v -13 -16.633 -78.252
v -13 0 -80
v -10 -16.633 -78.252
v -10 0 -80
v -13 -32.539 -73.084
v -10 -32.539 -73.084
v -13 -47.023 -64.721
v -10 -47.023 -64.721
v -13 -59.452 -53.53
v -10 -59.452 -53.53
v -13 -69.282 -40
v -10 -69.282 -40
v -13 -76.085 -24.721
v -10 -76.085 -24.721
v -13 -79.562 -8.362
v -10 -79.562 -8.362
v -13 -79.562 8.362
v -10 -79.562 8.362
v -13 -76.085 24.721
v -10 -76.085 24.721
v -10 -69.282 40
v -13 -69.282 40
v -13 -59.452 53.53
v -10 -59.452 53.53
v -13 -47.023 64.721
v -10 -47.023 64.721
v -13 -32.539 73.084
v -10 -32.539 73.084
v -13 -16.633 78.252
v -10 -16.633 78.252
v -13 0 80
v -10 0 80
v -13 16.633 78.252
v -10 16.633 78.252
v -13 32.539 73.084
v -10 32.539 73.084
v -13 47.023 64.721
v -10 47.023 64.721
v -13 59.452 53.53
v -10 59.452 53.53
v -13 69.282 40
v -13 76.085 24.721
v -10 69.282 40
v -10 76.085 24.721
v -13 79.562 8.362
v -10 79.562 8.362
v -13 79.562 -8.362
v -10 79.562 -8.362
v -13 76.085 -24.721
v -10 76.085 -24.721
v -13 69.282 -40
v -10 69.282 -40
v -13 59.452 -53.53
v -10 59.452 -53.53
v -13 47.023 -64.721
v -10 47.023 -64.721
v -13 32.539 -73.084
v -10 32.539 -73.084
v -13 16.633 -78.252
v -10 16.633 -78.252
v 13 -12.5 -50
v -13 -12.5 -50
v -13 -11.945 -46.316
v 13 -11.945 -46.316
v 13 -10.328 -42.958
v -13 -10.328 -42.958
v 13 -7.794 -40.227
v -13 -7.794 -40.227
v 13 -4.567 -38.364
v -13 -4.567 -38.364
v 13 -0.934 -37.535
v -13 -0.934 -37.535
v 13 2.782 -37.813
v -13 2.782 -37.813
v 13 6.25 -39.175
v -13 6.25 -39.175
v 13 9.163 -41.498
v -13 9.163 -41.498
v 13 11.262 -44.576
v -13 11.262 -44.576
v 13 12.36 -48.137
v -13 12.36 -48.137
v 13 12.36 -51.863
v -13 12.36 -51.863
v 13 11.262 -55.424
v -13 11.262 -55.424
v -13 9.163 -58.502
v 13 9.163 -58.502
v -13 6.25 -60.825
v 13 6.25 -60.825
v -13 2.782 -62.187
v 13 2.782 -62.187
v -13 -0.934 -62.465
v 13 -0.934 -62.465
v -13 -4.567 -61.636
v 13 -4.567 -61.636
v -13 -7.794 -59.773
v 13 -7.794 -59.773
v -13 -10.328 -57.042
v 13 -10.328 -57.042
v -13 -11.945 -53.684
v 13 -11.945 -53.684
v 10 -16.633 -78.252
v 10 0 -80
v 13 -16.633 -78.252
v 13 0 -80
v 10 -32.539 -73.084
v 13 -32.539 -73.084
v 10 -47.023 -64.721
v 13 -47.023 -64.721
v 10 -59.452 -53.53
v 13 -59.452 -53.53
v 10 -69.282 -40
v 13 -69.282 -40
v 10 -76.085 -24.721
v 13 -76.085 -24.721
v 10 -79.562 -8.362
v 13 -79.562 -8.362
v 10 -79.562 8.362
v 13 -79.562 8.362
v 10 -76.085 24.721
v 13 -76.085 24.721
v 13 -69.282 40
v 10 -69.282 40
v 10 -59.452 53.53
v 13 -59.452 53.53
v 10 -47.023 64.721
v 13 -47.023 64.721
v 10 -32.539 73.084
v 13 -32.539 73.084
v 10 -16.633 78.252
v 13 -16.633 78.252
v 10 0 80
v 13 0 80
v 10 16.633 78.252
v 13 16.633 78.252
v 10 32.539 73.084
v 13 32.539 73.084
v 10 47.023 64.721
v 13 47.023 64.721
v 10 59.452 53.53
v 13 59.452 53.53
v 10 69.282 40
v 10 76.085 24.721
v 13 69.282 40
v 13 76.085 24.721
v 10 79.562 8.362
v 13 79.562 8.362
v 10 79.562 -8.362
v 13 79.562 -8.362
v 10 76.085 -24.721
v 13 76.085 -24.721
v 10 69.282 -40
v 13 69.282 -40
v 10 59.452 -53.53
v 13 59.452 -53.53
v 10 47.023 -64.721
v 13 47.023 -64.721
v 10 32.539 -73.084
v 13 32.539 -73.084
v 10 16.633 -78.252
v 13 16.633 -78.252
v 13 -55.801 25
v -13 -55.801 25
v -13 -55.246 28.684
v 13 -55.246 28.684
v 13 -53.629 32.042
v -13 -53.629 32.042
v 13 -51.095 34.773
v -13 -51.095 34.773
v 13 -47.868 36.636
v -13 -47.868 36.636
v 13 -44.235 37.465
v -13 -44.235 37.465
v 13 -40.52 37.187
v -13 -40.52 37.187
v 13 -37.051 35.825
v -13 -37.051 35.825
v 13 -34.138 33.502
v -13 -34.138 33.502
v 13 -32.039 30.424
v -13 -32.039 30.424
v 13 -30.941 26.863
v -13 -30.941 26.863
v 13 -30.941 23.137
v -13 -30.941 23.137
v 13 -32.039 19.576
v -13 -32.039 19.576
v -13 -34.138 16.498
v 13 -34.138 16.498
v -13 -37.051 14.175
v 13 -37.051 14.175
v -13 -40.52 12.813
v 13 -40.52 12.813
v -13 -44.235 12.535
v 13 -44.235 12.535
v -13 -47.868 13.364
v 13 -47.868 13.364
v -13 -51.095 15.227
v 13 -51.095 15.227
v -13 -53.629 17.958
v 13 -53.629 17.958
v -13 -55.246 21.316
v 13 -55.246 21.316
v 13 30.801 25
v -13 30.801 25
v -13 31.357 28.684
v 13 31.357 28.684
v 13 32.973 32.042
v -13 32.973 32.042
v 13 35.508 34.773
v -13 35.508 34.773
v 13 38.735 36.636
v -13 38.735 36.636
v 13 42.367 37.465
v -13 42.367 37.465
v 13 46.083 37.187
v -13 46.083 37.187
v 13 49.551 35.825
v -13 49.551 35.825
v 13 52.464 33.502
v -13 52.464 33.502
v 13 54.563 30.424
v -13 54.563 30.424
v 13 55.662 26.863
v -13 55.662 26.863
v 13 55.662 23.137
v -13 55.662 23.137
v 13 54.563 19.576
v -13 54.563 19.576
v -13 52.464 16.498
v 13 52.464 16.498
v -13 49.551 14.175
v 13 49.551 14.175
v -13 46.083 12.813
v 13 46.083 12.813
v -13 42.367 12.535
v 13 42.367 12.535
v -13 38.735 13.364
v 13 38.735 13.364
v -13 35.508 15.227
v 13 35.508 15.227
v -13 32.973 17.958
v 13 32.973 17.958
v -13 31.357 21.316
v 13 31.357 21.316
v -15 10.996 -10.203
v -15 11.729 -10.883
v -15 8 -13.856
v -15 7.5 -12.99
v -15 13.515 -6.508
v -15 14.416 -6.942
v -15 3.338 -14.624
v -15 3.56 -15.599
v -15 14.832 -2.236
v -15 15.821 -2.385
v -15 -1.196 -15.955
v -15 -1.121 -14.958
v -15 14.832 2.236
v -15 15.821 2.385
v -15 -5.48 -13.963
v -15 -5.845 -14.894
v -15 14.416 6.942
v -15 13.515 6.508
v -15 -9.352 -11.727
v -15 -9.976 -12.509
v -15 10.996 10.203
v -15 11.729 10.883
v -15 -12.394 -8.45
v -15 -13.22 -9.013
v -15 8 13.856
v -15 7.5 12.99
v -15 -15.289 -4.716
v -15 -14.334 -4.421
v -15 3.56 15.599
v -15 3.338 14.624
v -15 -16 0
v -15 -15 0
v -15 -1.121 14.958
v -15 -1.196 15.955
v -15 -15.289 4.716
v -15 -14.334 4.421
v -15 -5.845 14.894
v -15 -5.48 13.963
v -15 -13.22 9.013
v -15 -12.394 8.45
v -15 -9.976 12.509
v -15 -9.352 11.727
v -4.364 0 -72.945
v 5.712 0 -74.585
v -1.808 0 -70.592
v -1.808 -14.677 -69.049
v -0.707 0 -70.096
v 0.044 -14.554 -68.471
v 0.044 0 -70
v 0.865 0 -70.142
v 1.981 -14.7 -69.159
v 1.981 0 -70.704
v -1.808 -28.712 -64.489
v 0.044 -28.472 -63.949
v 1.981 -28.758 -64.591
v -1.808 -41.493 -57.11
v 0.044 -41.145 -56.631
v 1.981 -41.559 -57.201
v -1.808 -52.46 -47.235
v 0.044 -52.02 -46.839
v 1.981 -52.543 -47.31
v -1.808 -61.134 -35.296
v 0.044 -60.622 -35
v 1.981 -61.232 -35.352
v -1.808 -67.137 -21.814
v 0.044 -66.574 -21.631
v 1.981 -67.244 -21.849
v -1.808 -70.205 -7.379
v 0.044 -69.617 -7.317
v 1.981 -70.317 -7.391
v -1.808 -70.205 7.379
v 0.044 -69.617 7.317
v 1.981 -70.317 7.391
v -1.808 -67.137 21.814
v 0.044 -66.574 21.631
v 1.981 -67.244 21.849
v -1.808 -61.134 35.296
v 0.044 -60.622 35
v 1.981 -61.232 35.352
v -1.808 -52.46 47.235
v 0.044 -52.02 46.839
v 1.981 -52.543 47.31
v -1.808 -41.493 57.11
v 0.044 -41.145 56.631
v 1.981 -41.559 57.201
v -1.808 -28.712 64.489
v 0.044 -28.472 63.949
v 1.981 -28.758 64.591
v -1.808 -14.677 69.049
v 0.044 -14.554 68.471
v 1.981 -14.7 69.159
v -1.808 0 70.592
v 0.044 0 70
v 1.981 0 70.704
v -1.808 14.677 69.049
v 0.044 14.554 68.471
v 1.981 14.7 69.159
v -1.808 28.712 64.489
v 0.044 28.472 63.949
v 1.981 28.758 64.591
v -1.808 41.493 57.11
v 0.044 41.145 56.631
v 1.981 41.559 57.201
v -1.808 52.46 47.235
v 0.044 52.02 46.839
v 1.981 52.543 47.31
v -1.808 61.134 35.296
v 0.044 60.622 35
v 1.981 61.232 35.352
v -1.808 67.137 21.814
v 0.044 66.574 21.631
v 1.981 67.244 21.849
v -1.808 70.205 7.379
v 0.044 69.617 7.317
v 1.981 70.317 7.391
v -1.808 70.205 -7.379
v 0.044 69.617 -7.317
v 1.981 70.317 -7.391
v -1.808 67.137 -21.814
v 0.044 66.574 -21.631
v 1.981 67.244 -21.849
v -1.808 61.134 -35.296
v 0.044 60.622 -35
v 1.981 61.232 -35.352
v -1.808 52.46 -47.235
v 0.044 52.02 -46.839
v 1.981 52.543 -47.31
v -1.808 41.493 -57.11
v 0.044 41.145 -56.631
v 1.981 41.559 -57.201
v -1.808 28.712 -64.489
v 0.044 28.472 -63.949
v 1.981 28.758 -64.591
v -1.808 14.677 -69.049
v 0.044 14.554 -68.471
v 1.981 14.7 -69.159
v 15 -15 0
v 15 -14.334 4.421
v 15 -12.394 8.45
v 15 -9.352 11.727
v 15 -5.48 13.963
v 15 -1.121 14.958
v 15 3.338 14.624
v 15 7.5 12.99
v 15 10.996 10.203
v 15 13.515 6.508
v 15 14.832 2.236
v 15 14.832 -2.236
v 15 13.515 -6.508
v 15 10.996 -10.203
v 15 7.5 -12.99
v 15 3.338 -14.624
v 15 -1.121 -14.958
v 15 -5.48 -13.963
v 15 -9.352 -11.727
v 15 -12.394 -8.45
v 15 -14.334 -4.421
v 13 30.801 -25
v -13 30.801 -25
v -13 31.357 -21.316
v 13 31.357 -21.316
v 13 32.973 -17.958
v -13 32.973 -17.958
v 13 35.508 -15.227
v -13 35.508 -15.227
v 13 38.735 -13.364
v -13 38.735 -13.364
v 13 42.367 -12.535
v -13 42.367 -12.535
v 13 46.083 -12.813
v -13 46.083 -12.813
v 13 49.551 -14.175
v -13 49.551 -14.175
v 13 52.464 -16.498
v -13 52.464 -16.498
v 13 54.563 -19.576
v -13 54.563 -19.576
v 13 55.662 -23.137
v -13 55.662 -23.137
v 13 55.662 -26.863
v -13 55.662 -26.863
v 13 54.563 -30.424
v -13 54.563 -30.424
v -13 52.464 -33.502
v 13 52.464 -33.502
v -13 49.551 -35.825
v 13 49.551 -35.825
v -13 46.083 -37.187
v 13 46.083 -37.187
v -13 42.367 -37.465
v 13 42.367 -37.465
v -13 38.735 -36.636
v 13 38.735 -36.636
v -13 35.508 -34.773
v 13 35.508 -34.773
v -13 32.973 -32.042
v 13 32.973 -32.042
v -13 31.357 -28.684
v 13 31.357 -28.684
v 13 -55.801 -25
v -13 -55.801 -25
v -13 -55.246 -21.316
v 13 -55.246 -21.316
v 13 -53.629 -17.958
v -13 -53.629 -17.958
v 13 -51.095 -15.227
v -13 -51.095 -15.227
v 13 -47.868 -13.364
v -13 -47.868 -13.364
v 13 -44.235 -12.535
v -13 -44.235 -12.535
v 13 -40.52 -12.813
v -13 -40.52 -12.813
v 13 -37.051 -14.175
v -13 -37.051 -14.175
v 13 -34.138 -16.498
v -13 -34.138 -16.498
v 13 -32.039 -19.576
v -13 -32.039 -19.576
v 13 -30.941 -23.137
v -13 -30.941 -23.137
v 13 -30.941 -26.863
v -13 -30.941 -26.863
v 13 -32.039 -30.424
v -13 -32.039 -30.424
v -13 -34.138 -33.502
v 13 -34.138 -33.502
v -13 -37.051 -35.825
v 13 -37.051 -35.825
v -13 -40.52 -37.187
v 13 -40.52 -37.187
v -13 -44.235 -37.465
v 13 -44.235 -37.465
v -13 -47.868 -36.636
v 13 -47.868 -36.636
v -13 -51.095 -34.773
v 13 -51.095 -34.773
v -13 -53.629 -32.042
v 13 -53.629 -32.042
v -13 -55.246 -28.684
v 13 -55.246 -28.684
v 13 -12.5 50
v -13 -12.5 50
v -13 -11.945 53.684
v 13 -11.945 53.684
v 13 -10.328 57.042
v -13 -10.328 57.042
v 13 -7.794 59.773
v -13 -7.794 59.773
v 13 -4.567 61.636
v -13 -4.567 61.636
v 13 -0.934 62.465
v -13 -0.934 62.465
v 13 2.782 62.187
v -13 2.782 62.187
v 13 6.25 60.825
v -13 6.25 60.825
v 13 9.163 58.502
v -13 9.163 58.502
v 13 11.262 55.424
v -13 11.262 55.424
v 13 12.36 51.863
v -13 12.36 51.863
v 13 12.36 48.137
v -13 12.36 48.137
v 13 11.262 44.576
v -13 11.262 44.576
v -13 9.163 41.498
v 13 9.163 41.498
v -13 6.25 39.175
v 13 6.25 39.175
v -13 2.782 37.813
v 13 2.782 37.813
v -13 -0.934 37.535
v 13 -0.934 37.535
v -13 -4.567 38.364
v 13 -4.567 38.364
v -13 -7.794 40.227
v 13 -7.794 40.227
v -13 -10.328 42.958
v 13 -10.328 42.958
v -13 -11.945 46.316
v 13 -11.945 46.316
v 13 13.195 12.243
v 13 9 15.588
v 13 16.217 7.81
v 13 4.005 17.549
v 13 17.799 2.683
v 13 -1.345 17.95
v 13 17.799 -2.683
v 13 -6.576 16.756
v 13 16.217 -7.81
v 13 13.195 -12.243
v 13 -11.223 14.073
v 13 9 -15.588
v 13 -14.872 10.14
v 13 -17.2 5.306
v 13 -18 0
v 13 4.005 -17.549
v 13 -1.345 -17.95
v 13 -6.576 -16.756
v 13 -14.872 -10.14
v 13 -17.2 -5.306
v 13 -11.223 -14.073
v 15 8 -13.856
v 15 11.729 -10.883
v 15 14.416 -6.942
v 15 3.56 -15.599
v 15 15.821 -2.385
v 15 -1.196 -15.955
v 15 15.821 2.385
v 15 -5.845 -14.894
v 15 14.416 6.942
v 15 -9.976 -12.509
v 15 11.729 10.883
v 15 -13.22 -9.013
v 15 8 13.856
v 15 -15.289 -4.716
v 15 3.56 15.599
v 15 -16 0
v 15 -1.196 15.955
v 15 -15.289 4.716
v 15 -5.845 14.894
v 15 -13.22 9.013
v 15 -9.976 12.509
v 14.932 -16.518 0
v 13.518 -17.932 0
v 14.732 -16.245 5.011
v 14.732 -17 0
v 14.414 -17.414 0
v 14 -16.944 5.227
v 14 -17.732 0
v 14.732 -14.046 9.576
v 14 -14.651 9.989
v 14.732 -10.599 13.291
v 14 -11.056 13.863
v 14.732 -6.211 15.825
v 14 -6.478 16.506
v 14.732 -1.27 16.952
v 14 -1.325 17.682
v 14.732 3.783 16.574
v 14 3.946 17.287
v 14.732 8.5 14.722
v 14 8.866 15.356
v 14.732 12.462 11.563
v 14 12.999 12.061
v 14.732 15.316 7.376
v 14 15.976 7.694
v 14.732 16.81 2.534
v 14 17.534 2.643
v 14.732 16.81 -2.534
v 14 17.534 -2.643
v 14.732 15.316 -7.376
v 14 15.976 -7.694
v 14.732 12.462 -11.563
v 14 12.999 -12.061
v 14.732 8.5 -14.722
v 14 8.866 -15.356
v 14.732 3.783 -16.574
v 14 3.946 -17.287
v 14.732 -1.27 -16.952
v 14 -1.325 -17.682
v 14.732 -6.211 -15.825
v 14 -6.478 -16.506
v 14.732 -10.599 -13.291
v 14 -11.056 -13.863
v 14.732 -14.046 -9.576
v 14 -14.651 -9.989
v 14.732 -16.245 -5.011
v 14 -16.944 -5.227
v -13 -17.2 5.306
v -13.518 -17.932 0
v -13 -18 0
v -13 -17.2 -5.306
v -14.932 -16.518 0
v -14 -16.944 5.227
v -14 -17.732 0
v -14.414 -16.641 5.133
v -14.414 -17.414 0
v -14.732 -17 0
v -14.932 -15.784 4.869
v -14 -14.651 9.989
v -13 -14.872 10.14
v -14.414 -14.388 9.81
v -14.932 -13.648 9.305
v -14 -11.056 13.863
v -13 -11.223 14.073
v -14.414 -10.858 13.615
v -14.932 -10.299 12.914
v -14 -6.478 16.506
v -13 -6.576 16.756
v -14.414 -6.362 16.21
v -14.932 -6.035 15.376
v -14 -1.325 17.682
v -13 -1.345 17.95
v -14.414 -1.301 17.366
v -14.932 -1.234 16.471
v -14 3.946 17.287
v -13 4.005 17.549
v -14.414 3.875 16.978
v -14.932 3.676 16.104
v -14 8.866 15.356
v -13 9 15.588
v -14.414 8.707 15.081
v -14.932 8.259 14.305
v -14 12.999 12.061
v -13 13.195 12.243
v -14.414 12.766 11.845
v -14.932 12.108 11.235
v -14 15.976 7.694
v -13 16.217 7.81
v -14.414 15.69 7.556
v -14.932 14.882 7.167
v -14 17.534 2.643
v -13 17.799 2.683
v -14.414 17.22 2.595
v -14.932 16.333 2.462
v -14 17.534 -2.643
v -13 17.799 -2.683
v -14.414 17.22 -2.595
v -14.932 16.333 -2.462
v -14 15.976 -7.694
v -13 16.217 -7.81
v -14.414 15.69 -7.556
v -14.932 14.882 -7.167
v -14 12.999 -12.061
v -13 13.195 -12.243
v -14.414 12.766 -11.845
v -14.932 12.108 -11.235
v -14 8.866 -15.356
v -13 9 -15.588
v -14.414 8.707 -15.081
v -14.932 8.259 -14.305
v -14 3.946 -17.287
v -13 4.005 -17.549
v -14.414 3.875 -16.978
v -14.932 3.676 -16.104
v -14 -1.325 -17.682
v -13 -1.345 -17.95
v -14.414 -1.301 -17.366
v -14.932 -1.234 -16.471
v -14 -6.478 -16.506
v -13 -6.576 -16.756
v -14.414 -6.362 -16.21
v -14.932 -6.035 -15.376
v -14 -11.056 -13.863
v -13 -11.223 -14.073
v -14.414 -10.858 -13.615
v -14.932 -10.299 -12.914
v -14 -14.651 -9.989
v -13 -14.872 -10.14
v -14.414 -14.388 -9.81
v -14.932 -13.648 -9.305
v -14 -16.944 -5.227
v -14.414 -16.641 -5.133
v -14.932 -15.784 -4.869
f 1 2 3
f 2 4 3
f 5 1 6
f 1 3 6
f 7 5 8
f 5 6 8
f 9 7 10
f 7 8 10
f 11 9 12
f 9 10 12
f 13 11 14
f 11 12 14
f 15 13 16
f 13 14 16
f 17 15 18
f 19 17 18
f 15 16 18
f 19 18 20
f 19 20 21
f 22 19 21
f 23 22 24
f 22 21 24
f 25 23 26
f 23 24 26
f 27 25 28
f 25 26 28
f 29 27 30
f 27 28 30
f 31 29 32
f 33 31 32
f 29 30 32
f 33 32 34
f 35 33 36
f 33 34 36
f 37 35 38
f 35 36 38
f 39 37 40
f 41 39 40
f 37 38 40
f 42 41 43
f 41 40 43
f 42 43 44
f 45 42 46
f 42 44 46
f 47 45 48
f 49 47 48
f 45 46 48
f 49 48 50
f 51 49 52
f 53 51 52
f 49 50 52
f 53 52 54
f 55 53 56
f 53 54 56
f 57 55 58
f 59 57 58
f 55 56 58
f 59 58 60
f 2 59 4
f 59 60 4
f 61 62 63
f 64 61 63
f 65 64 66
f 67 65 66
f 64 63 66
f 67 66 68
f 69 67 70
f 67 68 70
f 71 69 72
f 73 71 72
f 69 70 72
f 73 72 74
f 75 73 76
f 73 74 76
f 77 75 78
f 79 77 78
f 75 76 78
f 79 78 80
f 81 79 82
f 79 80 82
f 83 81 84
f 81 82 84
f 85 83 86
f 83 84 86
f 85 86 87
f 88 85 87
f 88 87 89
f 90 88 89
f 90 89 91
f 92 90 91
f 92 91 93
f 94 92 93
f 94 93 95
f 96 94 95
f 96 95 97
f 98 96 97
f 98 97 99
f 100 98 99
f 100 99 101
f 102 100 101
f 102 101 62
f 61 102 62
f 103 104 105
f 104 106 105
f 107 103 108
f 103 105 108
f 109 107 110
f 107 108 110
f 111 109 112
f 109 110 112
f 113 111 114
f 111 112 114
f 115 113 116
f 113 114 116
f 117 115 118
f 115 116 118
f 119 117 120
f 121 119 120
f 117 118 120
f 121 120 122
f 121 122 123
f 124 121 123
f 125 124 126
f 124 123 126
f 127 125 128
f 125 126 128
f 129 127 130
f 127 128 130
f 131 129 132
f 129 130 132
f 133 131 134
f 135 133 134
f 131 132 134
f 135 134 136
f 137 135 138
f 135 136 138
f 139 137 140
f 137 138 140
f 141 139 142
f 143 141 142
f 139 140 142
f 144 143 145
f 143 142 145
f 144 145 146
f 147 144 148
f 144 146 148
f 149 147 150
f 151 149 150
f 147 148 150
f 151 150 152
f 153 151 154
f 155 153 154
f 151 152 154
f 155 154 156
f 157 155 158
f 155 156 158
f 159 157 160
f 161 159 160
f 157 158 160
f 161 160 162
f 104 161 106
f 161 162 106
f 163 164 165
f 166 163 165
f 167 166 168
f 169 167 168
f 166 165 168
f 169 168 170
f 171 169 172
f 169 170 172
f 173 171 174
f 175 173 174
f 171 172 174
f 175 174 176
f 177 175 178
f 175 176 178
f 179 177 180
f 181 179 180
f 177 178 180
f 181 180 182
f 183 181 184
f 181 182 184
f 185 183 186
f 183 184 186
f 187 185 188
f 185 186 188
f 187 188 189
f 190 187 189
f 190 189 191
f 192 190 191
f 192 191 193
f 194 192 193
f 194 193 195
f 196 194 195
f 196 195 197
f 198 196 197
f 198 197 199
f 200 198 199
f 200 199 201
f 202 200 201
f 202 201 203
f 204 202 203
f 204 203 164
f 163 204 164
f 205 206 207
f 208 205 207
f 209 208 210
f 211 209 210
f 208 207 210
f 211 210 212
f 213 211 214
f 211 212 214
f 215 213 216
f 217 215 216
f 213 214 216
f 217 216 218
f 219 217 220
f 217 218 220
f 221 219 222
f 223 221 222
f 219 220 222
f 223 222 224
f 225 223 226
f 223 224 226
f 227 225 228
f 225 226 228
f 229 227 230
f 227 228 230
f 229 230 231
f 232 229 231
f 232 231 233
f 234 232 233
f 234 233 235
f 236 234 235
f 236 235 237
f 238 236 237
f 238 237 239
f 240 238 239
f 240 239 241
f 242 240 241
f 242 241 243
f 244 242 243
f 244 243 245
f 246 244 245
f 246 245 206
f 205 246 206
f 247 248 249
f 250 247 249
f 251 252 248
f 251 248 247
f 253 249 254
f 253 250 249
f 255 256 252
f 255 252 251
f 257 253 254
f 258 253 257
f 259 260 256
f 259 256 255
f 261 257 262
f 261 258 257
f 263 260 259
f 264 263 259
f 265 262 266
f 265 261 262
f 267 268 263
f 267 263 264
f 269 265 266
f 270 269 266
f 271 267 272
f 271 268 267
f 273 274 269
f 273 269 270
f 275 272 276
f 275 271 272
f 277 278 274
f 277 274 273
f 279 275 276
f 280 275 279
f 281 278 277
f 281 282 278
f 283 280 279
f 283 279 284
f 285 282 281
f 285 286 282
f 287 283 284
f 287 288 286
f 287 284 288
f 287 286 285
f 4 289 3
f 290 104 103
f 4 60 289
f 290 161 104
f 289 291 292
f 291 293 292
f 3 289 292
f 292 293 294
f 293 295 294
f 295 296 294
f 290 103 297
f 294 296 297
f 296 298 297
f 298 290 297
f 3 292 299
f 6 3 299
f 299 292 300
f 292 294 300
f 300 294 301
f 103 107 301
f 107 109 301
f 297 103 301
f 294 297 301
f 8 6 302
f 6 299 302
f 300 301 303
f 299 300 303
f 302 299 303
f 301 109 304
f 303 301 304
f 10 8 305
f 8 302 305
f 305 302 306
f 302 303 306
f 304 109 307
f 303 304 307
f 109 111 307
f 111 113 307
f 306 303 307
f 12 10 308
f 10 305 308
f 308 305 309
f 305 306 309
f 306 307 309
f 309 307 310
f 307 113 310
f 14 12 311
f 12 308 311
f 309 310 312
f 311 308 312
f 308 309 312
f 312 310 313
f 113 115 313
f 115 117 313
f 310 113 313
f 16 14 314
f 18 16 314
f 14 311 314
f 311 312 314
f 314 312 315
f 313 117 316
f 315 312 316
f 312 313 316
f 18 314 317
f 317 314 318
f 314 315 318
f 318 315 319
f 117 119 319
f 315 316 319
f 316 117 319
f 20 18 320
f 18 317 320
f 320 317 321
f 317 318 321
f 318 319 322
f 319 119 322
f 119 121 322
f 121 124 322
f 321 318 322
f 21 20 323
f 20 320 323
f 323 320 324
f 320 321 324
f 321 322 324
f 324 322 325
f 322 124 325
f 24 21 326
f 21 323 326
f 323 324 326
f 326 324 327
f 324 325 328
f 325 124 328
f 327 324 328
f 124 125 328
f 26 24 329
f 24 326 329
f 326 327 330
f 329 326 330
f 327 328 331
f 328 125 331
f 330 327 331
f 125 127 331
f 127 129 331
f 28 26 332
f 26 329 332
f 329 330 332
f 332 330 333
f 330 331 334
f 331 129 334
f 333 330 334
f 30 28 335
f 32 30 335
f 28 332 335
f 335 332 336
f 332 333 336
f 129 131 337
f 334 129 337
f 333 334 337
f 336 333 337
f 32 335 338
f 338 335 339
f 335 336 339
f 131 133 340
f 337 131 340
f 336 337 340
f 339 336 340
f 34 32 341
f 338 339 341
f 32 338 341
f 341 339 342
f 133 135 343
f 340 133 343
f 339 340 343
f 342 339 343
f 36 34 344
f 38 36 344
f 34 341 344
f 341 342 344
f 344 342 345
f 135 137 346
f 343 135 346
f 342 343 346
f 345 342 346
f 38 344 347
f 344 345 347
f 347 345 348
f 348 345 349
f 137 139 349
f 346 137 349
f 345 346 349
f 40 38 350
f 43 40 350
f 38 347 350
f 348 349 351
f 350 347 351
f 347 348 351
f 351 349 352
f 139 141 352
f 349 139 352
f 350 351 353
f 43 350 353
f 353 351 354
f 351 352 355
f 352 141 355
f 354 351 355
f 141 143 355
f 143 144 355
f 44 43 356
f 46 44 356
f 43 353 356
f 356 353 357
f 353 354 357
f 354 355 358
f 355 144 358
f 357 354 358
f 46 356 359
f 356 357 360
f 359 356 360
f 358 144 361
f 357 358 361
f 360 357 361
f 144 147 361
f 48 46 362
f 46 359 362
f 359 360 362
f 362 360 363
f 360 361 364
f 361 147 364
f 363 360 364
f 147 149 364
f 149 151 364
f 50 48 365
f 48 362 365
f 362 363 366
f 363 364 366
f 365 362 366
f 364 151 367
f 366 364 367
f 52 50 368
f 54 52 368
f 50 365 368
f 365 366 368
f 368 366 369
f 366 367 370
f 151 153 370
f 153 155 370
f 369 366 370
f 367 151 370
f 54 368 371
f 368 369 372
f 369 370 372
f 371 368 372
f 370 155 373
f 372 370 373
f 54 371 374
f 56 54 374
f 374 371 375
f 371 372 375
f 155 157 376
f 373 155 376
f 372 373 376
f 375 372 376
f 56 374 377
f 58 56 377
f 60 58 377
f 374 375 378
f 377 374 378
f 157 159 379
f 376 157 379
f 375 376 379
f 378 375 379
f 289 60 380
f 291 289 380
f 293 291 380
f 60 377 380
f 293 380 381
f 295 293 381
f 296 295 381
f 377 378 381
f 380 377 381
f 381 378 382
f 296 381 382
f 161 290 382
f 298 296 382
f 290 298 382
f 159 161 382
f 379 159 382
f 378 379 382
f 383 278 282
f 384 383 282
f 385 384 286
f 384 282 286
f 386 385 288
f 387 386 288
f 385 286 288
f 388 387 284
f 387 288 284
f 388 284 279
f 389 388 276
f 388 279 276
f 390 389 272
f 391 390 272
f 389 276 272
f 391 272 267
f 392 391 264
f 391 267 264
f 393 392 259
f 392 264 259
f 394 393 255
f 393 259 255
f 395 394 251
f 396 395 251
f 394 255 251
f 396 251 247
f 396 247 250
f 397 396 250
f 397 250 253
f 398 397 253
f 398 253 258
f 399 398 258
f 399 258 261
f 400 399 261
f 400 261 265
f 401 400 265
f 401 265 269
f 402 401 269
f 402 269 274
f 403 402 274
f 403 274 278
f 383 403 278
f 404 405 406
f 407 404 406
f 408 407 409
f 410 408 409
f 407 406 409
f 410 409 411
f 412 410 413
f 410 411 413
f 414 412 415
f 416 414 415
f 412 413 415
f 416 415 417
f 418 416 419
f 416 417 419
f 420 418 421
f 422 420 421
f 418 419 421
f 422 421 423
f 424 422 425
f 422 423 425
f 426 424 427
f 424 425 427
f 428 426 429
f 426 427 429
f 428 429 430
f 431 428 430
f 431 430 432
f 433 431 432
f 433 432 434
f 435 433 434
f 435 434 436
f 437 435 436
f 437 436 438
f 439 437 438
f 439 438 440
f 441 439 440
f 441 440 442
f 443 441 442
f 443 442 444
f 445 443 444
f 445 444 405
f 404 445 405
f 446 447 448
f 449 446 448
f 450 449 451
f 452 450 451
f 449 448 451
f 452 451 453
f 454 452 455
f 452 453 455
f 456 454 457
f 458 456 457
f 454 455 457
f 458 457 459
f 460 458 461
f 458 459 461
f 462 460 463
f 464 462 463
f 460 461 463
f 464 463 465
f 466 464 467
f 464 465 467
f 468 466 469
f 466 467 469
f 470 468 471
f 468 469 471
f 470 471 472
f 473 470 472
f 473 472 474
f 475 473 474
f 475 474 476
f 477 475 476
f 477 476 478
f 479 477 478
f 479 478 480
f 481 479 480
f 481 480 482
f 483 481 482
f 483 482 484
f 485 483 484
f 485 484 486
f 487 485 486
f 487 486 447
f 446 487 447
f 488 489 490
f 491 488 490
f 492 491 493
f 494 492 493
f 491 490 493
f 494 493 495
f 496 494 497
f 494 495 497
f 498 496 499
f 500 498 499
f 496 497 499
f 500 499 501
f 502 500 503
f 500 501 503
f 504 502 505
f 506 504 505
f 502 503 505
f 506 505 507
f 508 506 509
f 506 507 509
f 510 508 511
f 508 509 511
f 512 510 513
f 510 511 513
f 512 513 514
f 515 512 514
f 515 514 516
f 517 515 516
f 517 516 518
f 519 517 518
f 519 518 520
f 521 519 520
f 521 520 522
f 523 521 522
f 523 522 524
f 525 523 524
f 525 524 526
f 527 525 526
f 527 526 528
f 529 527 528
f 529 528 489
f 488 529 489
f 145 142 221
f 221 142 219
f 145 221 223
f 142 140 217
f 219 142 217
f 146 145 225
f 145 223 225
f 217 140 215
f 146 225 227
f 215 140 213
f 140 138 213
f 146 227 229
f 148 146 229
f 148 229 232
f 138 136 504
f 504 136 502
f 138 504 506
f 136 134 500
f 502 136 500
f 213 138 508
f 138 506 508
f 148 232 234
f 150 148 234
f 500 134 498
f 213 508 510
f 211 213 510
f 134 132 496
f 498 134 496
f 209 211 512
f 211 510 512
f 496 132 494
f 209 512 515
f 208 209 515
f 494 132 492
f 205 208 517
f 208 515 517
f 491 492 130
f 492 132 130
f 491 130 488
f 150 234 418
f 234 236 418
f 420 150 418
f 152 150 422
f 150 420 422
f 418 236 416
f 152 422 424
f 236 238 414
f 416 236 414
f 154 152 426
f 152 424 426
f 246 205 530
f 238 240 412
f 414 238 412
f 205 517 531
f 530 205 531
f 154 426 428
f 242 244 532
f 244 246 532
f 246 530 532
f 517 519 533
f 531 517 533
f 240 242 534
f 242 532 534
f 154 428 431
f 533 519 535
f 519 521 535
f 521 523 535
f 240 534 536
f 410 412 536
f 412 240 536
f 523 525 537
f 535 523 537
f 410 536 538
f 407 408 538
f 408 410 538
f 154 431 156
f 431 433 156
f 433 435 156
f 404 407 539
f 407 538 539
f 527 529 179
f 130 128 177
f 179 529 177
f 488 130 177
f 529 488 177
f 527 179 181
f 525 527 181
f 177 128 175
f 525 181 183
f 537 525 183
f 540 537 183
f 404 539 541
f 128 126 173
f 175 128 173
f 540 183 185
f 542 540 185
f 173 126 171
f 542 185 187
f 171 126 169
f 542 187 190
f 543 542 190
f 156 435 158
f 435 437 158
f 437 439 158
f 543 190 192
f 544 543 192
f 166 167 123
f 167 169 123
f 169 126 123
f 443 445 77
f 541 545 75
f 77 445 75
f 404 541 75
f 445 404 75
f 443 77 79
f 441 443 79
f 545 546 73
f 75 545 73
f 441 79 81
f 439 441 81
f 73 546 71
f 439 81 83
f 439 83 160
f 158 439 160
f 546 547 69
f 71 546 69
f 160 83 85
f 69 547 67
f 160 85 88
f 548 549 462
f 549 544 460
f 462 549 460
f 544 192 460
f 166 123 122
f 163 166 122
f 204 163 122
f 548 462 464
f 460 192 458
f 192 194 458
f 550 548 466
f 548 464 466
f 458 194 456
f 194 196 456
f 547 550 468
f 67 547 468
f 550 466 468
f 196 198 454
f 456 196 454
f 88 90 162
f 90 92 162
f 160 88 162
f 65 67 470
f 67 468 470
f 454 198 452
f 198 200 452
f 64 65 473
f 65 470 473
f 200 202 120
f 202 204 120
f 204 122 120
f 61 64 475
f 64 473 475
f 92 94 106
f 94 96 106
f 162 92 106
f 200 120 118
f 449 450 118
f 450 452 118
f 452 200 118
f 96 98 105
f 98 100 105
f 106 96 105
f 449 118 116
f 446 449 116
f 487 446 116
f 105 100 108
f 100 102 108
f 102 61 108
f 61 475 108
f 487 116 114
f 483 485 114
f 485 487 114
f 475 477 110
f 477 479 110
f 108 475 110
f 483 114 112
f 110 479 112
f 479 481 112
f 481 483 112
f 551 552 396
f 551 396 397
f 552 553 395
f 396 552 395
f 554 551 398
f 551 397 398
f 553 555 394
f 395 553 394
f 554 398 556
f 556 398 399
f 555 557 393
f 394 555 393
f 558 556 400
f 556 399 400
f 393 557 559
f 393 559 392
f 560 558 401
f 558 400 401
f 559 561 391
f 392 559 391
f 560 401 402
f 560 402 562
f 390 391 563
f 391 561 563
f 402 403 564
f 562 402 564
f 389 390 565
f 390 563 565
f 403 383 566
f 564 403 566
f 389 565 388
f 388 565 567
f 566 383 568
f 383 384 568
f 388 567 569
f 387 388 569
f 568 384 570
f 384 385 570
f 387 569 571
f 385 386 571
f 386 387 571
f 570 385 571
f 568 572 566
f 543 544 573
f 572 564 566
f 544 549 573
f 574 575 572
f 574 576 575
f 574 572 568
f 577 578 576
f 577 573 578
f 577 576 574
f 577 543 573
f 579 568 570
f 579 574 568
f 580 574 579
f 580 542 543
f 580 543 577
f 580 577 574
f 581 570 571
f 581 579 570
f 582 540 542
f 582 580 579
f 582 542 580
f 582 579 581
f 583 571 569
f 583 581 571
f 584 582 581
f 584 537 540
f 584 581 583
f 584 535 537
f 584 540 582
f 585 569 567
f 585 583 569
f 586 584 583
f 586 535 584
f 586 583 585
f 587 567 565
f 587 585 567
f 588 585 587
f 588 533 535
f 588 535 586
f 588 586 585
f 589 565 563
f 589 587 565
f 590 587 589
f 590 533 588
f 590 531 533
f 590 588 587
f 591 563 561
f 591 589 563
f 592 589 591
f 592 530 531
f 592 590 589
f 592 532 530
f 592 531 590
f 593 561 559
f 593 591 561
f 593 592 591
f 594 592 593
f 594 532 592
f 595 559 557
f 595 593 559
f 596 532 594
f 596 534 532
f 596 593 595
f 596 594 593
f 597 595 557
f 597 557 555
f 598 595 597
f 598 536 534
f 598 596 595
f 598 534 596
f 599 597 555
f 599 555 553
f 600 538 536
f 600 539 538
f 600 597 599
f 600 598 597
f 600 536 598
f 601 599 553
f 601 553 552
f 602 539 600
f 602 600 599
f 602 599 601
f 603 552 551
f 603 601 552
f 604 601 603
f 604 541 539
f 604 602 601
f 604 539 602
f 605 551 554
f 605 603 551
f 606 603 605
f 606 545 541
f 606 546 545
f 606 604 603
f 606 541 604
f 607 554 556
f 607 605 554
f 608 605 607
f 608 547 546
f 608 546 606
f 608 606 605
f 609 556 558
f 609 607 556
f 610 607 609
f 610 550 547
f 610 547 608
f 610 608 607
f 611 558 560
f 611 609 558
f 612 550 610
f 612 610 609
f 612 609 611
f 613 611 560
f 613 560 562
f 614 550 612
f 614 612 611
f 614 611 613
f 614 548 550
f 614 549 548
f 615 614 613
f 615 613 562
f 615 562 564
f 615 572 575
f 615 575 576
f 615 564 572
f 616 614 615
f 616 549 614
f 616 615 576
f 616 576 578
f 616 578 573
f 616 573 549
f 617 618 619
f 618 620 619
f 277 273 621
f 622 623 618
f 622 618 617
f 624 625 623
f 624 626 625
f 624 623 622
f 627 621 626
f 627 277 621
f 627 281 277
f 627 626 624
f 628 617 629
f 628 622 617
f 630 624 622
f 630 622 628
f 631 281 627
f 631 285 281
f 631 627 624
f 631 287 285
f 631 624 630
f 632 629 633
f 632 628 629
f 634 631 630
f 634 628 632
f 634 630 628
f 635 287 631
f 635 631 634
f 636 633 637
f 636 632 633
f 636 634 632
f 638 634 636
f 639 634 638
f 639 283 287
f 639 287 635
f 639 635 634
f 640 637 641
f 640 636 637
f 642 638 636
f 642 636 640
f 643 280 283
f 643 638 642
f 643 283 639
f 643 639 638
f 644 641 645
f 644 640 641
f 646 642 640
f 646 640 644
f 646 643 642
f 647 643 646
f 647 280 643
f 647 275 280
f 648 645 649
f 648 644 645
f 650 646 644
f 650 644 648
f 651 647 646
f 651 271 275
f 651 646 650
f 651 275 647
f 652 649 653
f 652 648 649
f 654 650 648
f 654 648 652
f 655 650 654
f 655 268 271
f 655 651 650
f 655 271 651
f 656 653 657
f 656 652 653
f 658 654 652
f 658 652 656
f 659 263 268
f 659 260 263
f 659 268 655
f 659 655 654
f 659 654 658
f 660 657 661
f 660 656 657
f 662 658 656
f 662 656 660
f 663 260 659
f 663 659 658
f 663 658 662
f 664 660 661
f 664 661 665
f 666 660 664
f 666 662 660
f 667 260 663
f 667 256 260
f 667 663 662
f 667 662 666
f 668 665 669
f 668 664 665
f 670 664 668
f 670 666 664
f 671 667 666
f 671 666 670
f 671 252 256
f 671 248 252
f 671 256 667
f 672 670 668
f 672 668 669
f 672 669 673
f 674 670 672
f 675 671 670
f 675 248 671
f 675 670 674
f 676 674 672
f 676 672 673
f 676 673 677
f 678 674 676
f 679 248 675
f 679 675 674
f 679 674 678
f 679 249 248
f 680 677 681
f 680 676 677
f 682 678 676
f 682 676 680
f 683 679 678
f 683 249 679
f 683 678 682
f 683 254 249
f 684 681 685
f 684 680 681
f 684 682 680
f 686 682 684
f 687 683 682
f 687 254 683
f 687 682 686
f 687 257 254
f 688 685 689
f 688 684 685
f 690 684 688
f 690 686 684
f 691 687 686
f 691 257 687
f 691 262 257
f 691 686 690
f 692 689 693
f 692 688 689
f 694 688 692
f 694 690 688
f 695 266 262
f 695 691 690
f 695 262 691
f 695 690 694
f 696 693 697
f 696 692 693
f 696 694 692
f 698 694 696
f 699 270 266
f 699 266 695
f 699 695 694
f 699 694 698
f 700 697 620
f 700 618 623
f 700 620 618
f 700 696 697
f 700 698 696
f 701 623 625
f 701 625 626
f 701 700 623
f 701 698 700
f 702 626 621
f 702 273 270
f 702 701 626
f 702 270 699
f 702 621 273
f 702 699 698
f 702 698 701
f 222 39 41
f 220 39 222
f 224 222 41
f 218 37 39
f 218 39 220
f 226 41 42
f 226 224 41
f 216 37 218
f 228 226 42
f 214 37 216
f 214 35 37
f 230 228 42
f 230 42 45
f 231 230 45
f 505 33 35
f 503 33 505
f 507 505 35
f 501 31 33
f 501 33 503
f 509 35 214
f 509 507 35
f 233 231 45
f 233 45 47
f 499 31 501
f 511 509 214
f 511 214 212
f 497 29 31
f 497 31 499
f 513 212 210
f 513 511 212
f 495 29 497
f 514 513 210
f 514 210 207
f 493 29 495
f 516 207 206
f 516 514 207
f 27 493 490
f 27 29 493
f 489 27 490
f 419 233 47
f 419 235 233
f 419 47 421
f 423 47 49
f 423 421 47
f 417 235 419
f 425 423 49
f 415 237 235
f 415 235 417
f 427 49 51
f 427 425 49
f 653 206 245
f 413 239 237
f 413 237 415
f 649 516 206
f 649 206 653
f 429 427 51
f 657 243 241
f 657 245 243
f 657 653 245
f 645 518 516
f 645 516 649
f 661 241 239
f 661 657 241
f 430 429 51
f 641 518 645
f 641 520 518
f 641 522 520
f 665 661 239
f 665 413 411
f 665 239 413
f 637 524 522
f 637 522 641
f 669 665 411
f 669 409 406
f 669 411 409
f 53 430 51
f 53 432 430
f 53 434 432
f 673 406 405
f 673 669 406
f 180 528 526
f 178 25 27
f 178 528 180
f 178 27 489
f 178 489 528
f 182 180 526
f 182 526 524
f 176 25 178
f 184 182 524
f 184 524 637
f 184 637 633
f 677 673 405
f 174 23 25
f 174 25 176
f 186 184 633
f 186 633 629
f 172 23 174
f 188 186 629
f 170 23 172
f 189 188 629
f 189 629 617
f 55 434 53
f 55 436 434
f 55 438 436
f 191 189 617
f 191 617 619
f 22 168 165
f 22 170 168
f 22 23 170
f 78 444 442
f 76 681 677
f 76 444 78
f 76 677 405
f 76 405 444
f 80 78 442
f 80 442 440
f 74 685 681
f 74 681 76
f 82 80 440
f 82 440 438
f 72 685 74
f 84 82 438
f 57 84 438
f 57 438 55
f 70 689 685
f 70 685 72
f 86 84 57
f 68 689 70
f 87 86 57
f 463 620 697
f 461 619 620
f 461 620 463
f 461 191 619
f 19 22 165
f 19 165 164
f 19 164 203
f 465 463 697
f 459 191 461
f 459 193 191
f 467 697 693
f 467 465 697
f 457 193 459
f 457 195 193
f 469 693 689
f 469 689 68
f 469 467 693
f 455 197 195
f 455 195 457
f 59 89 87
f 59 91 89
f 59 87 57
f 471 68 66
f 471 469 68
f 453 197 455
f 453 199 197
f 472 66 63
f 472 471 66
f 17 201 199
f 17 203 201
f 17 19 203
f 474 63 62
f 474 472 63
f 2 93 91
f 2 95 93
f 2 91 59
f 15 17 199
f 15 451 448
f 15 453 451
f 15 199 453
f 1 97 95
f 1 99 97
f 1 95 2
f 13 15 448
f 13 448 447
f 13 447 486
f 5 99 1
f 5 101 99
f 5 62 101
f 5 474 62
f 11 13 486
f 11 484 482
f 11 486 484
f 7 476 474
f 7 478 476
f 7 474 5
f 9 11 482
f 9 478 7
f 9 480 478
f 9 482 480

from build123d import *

# Parameters (mm, degrees)
F0_W          = 3
F0_H          = 80
F2_R          = 12.5
F3_DEPTH      = 119.80777
F4_R          = 15
F5_DEPTH      = 102.88035
F4_R_2        = 18
F6_DEPTH      = 2
F6_DEPTH_BACK = 28
F7_R          = 1.99999


# Not quite as in the source:
# - a fillet or chamfer is up to 0.001 mm smaller than in the source, because OpenCascade refuses the exact size


with BuildPart() as f1:
    # F0 (on Front) → F1 (revolve)
    with BuildSketch(Plane.XZ):
        with Locations((11.5, -40)):
            Rectangle(F0_W, F0_H)
        with BuildLine():
            Line((10, -80), (10, 0))
            Line((10, 0), (0, 0))
            Line((0, 0), (-10, 0))
            Line((-10, 0), (-10, -80))
            add(Edge.make_bspline(
                [(-10, -80), (-6, -75.3330111863), (0, -64.6669888505), (6, -75.3330111128), (10, -80)],
                knots=[0, 0, 0, 0, 0.5, 1, 1, 1, 1], degree=3))
        make_face()
        with Locations((-11.5, -40)):
            Rectangle(F0_W, F0_H)
    revolve(axis=Axis((-1.5, 0, 0), (-1, 0, 0)))

    # F2 (on face) → F3 (cut)
    with BuildSketch(Plane(origin=(-13, 0, 0), x_dir=(0, -1, 0), z_dir=(-1, 0, 0))):
        with Locations((-43.3012701892, 25)):
            Circle(F2_R)
        with Locations((43.3012701892, 25)):
            Circle(F2_R)
        with Locations((43.3012701892, -25)):
            Circle(F2_R)
        with Locations((0, -50)):
            Circle(F2_R)
        with Locations((-43.3012701892, -25)):
            Circle(F2_R)
        with Locations((0, 50)):
            Circle(F2_R)
    extrude(amount=-F3_DEPTH, mode=Mode.SUBTRACT)

    # F4 (on face) → F5 (cut)
    with BuildSketch(Plane(origin=(-13, 0, 0), x_dir=(0, -1, 0), z_dir=(-1, 0, 0))):
        Circle(F4_R)
    extrude(amount=-F5_DEPTH, mode=Mode.SUBTRACT)

    # F4 (on face) → F6 (join, two sides)
    with BuildSketch(Plane(origin=(-13, 0, 0), x_dir=(0, -1, 0), z_dir=(-1, 0, 0))) as f6_sk:
        Circle(F4_R_2)
        Circle(F4_R, mode=Mode.SUBTRACT)
    extrude(amount=F6_DEPTH)
    extrude(f6_sk.sketch, amount=-F6_DEPTH_BACK)

    # F7 (radius 2 in the source; OpenCascade refuses exactly that, so slightly less here)
    f7_edges = [f1.edges().sort_by_distance(p)[0] for p in [
        (-15, 18, 0),
        (15, 18, 0),
    ]]
    fillet(f7_edges, radius=F7_R)


solid = f1.part
